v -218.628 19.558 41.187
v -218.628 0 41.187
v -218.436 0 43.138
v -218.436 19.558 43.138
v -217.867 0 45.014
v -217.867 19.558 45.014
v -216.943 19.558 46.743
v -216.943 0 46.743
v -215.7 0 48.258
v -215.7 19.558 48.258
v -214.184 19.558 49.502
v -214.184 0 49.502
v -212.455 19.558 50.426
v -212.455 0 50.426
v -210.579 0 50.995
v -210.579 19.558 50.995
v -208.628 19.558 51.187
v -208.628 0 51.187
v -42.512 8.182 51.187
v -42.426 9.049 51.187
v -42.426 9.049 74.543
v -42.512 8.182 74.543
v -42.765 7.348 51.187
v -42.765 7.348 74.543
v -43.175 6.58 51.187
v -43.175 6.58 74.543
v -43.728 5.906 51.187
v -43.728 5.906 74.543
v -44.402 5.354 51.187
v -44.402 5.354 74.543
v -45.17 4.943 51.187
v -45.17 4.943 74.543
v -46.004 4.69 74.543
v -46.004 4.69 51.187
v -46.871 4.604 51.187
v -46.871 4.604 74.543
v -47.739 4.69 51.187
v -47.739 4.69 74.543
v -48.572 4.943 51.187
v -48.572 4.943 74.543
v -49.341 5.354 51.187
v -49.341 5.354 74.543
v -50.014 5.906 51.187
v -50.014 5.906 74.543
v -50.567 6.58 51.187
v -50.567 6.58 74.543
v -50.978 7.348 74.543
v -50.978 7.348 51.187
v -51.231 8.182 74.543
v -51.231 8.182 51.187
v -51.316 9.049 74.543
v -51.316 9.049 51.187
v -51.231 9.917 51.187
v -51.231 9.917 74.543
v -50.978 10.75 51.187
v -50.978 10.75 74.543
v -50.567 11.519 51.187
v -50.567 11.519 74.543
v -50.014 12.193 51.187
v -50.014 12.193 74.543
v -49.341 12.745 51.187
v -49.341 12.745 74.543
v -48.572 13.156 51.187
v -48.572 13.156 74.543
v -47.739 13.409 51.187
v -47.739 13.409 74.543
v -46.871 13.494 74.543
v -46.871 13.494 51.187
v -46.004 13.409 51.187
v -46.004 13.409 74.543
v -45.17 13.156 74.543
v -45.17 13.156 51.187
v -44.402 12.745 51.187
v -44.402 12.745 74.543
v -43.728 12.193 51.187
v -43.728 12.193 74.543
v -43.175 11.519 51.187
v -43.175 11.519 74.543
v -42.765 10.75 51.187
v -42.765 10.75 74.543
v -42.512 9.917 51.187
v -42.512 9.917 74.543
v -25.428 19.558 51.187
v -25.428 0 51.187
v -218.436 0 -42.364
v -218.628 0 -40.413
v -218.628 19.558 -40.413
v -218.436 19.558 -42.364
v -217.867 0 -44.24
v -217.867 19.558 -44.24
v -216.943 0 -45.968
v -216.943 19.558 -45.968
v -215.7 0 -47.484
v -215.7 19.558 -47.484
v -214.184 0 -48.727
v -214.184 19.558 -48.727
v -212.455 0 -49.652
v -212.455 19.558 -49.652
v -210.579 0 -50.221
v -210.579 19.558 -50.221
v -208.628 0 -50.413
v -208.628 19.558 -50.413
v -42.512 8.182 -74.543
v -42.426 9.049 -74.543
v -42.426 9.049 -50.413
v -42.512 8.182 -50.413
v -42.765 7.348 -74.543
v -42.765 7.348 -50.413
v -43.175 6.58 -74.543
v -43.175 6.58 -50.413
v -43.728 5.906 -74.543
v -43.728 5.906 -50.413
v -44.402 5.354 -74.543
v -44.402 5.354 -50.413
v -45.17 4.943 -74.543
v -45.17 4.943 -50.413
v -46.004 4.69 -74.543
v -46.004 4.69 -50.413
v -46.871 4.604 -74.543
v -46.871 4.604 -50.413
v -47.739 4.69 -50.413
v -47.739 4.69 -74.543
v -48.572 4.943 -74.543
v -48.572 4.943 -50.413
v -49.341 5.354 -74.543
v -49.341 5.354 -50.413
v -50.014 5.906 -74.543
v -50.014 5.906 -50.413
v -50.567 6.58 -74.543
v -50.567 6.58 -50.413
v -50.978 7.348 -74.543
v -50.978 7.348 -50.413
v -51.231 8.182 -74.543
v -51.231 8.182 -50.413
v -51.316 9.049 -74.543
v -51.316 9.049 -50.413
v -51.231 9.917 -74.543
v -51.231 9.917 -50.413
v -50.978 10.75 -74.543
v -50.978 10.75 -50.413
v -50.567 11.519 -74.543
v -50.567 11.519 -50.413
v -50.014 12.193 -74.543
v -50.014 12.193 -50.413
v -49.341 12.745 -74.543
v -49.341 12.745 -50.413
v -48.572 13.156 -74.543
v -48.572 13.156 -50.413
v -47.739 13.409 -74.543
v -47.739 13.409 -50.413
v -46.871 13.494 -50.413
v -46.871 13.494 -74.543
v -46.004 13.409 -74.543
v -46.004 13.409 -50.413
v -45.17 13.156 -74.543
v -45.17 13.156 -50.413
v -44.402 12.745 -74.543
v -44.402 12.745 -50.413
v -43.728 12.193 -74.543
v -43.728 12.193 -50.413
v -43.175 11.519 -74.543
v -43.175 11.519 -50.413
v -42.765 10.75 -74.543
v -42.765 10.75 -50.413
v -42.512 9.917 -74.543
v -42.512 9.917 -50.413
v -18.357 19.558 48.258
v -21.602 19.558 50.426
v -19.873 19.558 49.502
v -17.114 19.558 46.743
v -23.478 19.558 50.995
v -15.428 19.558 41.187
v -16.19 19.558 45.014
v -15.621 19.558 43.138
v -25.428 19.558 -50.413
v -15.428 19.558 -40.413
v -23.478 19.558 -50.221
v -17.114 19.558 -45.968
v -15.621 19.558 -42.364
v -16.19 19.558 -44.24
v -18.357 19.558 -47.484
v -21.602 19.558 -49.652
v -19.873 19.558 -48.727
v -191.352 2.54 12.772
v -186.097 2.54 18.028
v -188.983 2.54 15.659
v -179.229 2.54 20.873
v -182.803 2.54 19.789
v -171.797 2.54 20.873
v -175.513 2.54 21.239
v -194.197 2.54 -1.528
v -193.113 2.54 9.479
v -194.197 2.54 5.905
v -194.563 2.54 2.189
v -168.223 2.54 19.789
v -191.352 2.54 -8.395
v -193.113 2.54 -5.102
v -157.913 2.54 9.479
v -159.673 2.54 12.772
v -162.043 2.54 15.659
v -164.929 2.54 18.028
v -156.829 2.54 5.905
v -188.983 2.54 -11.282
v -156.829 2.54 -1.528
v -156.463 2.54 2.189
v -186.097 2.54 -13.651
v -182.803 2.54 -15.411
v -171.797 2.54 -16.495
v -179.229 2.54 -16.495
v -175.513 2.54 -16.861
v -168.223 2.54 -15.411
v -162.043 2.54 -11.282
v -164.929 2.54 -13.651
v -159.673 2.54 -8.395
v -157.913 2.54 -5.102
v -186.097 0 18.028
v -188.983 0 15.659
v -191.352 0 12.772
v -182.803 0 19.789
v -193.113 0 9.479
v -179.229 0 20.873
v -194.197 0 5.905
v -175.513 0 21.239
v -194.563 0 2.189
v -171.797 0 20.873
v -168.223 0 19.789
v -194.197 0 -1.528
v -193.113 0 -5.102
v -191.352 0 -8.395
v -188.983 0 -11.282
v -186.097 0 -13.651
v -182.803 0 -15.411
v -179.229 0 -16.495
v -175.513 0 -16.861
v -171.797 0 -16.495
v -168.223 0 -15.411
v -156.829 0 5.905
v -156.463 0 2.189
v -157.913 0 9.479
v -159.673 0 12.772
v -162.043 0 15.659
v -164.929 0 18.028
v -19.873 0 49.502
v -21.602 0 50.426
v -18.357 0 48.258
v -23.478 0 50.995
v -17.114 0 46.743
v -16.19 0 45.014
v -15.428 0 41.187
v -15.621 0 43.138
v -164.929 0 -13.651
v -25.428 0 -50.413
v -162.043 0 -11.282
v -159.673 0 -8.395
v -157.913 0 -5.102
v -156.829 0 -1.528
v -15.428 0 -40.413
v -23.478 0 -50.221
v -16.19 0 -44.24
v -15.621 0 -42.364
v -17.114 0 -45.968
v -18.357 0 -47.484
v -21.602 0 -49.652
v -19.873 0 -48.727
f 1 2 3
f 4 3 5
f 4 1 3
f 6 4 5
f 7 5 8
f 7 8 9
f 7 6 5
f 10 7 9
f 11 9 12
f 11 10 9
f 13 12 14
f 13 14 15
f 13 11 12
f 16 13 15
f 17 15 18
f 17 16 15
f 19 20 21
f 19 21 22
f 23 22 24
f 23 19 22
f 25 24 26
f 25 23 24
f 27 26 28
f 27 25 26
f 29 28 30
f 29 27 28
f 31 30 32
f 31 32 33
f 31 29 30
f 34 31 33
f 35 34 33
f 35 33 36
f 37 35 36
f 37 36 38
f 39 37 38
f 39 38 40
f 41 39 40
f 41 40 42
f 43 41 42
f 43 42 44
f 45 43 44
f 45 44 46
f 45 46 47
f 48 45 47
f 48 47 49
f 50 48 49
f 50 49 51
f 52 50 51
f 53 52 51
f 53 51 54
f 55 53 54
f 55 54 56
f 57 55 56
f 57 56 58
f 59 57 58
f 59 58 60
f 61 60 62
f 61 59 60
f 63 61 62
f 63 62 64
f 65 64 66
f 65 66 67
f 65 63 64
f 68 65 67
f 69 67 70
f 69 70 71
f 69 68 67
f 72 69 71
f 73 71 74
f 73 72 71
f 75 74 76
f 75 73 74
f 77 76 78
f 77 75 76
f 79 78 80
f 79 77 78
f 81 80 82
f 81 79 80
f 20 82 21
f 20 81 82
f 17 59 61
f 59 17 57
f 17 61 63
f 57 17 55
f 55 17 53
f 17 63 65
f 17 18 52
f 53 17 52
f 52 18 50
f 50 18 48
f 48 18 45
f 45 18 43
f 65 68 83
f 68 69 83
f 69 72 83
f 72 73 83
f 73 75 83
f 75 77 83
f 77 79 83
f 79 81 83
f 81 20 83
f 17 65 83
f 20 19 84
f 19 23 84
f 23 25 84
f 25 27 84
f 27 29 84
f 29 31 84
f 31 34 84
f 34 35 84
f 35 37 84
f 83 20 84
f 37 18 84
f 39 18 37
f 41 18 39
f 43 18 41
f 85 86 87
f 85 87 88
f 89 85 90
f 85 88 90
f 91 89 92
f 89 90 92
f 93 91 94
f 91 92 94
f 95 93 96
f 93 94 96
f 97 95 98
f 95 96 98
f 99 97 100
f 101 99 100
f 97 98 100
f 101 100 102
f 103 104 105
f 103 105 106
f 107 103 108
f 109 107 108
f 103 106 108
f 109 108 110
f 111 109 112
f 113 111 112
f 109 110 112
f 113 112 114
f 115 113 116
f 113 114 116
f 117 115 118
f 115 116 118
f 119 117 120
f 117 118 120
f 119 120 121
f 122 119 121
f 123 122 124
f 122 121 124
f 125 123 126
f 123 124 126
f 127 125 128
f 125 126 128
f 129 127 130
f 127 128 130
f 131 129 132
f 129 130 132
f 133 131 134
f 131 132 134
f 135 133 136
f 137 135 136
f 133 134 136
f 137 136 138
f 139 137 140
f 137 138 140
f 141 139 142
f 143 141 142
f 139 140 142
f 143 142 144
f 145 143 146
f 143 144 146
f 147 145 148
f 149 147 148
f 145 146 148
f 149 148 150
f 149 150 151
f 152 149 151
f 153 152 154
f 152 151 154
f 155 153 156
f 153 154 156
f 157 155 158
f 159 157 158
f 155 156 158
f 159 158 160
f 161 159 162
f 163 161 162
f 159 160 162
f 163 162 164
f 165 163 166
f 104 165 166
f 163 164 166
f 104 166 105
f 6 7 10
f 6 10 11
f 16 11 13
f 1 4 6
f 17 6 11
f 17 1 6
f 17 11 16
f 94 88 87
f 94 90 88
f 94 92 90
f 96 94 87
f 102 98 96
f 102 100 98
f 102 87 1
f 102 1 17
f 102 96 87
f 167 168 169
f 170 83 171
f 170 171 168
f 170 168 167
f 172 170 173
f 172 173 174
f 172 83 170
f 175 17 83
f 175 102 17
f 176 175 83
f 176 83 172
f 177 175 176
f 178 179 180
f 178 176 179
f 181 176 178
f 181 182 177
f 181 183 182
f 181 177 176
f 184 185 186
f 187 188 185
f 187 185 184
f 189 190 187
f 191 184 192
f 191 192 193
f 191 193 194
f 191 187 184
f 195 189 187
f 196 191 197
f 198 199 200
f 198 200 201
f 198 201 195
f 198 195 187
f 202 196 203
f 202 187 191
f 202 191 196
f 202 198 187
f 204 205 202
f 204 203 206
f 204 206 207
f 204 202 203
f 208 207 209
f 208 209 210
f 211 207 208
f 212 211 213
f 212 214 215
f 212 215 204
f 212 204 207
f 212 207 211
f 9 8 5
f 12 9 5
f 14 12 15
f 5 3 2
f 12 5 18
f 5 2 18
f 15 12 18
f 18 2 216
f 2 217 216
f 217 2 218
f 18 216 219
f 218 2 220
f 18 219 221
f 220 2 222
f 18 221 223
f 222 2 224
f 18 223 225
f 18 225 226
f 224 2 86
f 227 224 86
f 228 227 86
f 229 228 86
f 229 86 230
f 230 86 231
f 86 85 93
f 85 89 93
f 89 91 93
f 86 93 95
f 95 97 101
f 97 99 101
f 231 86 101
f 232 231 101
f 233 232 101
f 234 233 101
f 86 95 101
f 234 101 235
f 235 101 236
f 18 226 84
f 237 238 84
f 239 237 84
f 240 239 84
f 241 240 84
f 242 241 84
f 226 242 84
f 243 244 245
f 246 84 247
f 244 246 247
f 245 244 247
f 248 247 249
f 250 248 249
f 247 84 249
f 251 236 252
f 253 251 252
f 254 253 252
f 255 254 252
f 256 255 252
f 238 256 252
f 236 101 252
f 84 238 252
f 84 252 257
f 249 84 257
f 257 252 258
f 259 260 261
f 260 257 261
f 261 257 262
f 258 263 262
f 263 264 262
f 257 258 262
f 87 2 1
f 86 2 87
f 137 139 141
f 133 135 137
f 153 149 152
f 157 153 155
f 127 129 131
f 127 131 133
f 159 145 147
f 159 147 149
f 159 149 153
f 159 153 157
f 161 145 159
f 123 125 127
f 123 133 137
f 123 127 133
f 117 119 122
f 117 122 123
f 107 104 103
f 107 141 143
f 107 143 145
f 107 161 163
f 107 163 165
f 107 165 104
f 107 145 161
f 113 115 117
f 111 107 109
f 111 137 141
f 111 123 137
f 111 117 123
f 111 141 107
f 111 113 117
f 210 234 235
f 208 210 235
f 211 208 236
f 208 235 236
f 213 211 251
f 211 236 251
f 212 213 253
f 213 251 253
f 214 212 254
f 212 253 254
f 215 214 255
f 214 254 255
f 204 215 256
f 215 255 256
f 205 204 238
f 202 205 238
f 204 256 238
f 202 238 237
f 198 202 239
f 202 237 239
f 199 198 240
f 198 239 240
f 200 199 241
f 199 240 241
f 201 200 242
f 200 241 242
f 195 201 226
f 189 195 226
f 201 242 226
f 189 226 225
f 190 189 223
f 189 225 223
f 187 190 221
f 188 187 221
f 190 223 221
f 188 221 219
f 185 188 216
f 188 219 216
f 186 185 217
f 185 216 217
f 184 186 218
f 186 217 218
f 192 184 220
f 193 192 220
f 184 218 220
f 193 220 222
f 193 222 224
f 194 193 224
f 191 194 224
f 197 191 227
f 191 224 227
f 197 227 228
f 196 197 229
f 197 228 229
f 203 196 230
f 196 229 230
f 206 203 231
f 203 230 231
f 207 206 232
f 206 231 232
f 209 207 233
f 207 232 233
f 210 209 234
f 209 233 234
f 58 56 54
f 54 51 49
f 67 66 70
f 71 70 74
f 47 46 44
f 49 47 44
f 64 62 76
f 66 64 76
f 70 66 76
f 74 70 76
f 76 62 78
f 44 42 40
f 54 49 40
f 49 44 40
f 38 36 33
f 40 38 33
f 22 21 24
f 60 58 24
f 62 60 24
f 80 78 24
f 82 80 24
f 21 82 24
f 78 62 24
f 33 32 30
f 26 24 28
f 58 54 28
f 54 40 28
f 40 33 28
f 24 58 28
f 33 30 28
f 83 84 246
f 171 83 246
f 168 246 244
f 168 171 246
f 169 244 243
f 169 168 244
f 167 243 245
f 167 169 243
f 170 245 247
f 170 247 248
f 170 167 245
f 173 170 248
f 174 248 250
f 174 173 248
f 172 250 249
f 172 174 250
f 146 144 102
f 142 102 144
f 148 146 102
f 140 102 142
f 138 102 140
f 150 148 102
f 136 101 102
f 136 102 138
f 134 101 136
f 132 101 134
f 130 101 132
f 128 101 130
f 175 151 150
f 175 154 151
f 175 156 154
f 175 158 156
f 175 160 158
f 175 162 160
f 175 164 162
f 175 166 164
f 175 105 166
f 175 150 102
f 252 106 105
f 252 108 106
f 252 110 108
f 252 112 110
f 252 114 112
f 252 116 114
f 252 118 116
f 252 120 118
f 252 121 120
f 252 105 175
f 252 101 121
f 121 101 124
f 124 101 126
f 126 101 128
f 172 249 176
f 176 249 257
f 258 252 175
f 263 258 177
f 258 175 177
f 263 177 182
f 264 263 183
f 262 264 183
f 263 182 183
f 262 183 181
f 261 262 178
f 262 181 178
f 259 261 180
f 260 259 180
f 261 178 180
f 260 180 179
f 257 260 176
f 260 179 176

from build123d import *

# Parameters (mm, degrees)
SKETCH2_W           = 203.2
SKETCH2_H           = 101.6
BOSS_EXTRUDE1_DEPTH = 19.558
FILLET1_R           = 10
FILLET2_R           = 10
FILLET3_R           = 10
FILLET4_R           = 10
SKETCH3_R           = 4.445
BOSS_EXTRUDE3_DEPTH = 24.13
SKETCH4_R           = 19.05
CUT_EXTRUDE1_DEPTH  = 2.54


with BuildPart() as part:
    # Sketch2 → Boss-Extrude1 (new body)
    with BuildSketch(Plane(origin=(-97.482495003, 0, 34.735141898), x_dir=(1, 0, 0), z_dir=(0, 1, 0))):
        with Locations((-19.545959724, 34.347881976)):
            Rectangle(SKETCH2_W, SKETCH2_H)
    extrude(amount=BOSS_EXTRUDE1_DEPTH)

    # Fillet1
    fillet1_edges = [part.edges().sort_by_distance(p)[0] for p in [
        (-15.428454726, 9.779, 51.187259921),
    ]]
    fillet(fillet1_edges, radius=FILLET1_R)

    # Fillet2
    fillet2_edges = [part.edges().sort_by_distance(p)[0] for p in [
        (-218.628454726, 9.779, -50.412740079),
    ]]
    fillet(fillet2_edges, radius=FILLET2_R)

    # Fillet3
    fillet3_edges = [part.edges().sort_by_distance(p)[0] for p in [
        (-218.628454726, 9.779, 51.187259921),
    ]]
    fillet(fillet3_edges, radius=FILLET3_R)

    # Fillet4
    fillet4_edges = [part.edges().sort_by_distance(p)[0] for p in [
        (-15.428454726, 9.779, -50.412740079),
    ]]
    fillet(fillet4_edges, radius=FILLET4_R)

    # Sketch3 → Boss-Extrude3 (add)
    with BuildSketch(Plane(origin=(0, 0, -50.412740079), x_dir=(-1, 0, 0), z_dir=(0, 0, -1))):
        with Locations(Location((46.871325594, 9.049463129, 0), (0, 0, 180))):
            Circle(SKETCH3_R)
    boss_extrude3 = extrude(amount=BOSS_EXTRUDE3_DEPTH)

    # Mirror2: Boss-Extrude3 across plane
    add(boss_extrude3.mirror(Plane.XY))

    # Sketch4 → Cut-Extrude1 (cut)
    with BuildSketch(Plane.XZ):
        with Locations(Location((-175.512993917, 2.188610614, 0), (0, 0, 270))):
            Circle(SKETCH4_R)
    extrude(amount=-CUT_EXTRUDE1_DEPTH, mode=Mode.SUBTRACT)


solid = part.part
